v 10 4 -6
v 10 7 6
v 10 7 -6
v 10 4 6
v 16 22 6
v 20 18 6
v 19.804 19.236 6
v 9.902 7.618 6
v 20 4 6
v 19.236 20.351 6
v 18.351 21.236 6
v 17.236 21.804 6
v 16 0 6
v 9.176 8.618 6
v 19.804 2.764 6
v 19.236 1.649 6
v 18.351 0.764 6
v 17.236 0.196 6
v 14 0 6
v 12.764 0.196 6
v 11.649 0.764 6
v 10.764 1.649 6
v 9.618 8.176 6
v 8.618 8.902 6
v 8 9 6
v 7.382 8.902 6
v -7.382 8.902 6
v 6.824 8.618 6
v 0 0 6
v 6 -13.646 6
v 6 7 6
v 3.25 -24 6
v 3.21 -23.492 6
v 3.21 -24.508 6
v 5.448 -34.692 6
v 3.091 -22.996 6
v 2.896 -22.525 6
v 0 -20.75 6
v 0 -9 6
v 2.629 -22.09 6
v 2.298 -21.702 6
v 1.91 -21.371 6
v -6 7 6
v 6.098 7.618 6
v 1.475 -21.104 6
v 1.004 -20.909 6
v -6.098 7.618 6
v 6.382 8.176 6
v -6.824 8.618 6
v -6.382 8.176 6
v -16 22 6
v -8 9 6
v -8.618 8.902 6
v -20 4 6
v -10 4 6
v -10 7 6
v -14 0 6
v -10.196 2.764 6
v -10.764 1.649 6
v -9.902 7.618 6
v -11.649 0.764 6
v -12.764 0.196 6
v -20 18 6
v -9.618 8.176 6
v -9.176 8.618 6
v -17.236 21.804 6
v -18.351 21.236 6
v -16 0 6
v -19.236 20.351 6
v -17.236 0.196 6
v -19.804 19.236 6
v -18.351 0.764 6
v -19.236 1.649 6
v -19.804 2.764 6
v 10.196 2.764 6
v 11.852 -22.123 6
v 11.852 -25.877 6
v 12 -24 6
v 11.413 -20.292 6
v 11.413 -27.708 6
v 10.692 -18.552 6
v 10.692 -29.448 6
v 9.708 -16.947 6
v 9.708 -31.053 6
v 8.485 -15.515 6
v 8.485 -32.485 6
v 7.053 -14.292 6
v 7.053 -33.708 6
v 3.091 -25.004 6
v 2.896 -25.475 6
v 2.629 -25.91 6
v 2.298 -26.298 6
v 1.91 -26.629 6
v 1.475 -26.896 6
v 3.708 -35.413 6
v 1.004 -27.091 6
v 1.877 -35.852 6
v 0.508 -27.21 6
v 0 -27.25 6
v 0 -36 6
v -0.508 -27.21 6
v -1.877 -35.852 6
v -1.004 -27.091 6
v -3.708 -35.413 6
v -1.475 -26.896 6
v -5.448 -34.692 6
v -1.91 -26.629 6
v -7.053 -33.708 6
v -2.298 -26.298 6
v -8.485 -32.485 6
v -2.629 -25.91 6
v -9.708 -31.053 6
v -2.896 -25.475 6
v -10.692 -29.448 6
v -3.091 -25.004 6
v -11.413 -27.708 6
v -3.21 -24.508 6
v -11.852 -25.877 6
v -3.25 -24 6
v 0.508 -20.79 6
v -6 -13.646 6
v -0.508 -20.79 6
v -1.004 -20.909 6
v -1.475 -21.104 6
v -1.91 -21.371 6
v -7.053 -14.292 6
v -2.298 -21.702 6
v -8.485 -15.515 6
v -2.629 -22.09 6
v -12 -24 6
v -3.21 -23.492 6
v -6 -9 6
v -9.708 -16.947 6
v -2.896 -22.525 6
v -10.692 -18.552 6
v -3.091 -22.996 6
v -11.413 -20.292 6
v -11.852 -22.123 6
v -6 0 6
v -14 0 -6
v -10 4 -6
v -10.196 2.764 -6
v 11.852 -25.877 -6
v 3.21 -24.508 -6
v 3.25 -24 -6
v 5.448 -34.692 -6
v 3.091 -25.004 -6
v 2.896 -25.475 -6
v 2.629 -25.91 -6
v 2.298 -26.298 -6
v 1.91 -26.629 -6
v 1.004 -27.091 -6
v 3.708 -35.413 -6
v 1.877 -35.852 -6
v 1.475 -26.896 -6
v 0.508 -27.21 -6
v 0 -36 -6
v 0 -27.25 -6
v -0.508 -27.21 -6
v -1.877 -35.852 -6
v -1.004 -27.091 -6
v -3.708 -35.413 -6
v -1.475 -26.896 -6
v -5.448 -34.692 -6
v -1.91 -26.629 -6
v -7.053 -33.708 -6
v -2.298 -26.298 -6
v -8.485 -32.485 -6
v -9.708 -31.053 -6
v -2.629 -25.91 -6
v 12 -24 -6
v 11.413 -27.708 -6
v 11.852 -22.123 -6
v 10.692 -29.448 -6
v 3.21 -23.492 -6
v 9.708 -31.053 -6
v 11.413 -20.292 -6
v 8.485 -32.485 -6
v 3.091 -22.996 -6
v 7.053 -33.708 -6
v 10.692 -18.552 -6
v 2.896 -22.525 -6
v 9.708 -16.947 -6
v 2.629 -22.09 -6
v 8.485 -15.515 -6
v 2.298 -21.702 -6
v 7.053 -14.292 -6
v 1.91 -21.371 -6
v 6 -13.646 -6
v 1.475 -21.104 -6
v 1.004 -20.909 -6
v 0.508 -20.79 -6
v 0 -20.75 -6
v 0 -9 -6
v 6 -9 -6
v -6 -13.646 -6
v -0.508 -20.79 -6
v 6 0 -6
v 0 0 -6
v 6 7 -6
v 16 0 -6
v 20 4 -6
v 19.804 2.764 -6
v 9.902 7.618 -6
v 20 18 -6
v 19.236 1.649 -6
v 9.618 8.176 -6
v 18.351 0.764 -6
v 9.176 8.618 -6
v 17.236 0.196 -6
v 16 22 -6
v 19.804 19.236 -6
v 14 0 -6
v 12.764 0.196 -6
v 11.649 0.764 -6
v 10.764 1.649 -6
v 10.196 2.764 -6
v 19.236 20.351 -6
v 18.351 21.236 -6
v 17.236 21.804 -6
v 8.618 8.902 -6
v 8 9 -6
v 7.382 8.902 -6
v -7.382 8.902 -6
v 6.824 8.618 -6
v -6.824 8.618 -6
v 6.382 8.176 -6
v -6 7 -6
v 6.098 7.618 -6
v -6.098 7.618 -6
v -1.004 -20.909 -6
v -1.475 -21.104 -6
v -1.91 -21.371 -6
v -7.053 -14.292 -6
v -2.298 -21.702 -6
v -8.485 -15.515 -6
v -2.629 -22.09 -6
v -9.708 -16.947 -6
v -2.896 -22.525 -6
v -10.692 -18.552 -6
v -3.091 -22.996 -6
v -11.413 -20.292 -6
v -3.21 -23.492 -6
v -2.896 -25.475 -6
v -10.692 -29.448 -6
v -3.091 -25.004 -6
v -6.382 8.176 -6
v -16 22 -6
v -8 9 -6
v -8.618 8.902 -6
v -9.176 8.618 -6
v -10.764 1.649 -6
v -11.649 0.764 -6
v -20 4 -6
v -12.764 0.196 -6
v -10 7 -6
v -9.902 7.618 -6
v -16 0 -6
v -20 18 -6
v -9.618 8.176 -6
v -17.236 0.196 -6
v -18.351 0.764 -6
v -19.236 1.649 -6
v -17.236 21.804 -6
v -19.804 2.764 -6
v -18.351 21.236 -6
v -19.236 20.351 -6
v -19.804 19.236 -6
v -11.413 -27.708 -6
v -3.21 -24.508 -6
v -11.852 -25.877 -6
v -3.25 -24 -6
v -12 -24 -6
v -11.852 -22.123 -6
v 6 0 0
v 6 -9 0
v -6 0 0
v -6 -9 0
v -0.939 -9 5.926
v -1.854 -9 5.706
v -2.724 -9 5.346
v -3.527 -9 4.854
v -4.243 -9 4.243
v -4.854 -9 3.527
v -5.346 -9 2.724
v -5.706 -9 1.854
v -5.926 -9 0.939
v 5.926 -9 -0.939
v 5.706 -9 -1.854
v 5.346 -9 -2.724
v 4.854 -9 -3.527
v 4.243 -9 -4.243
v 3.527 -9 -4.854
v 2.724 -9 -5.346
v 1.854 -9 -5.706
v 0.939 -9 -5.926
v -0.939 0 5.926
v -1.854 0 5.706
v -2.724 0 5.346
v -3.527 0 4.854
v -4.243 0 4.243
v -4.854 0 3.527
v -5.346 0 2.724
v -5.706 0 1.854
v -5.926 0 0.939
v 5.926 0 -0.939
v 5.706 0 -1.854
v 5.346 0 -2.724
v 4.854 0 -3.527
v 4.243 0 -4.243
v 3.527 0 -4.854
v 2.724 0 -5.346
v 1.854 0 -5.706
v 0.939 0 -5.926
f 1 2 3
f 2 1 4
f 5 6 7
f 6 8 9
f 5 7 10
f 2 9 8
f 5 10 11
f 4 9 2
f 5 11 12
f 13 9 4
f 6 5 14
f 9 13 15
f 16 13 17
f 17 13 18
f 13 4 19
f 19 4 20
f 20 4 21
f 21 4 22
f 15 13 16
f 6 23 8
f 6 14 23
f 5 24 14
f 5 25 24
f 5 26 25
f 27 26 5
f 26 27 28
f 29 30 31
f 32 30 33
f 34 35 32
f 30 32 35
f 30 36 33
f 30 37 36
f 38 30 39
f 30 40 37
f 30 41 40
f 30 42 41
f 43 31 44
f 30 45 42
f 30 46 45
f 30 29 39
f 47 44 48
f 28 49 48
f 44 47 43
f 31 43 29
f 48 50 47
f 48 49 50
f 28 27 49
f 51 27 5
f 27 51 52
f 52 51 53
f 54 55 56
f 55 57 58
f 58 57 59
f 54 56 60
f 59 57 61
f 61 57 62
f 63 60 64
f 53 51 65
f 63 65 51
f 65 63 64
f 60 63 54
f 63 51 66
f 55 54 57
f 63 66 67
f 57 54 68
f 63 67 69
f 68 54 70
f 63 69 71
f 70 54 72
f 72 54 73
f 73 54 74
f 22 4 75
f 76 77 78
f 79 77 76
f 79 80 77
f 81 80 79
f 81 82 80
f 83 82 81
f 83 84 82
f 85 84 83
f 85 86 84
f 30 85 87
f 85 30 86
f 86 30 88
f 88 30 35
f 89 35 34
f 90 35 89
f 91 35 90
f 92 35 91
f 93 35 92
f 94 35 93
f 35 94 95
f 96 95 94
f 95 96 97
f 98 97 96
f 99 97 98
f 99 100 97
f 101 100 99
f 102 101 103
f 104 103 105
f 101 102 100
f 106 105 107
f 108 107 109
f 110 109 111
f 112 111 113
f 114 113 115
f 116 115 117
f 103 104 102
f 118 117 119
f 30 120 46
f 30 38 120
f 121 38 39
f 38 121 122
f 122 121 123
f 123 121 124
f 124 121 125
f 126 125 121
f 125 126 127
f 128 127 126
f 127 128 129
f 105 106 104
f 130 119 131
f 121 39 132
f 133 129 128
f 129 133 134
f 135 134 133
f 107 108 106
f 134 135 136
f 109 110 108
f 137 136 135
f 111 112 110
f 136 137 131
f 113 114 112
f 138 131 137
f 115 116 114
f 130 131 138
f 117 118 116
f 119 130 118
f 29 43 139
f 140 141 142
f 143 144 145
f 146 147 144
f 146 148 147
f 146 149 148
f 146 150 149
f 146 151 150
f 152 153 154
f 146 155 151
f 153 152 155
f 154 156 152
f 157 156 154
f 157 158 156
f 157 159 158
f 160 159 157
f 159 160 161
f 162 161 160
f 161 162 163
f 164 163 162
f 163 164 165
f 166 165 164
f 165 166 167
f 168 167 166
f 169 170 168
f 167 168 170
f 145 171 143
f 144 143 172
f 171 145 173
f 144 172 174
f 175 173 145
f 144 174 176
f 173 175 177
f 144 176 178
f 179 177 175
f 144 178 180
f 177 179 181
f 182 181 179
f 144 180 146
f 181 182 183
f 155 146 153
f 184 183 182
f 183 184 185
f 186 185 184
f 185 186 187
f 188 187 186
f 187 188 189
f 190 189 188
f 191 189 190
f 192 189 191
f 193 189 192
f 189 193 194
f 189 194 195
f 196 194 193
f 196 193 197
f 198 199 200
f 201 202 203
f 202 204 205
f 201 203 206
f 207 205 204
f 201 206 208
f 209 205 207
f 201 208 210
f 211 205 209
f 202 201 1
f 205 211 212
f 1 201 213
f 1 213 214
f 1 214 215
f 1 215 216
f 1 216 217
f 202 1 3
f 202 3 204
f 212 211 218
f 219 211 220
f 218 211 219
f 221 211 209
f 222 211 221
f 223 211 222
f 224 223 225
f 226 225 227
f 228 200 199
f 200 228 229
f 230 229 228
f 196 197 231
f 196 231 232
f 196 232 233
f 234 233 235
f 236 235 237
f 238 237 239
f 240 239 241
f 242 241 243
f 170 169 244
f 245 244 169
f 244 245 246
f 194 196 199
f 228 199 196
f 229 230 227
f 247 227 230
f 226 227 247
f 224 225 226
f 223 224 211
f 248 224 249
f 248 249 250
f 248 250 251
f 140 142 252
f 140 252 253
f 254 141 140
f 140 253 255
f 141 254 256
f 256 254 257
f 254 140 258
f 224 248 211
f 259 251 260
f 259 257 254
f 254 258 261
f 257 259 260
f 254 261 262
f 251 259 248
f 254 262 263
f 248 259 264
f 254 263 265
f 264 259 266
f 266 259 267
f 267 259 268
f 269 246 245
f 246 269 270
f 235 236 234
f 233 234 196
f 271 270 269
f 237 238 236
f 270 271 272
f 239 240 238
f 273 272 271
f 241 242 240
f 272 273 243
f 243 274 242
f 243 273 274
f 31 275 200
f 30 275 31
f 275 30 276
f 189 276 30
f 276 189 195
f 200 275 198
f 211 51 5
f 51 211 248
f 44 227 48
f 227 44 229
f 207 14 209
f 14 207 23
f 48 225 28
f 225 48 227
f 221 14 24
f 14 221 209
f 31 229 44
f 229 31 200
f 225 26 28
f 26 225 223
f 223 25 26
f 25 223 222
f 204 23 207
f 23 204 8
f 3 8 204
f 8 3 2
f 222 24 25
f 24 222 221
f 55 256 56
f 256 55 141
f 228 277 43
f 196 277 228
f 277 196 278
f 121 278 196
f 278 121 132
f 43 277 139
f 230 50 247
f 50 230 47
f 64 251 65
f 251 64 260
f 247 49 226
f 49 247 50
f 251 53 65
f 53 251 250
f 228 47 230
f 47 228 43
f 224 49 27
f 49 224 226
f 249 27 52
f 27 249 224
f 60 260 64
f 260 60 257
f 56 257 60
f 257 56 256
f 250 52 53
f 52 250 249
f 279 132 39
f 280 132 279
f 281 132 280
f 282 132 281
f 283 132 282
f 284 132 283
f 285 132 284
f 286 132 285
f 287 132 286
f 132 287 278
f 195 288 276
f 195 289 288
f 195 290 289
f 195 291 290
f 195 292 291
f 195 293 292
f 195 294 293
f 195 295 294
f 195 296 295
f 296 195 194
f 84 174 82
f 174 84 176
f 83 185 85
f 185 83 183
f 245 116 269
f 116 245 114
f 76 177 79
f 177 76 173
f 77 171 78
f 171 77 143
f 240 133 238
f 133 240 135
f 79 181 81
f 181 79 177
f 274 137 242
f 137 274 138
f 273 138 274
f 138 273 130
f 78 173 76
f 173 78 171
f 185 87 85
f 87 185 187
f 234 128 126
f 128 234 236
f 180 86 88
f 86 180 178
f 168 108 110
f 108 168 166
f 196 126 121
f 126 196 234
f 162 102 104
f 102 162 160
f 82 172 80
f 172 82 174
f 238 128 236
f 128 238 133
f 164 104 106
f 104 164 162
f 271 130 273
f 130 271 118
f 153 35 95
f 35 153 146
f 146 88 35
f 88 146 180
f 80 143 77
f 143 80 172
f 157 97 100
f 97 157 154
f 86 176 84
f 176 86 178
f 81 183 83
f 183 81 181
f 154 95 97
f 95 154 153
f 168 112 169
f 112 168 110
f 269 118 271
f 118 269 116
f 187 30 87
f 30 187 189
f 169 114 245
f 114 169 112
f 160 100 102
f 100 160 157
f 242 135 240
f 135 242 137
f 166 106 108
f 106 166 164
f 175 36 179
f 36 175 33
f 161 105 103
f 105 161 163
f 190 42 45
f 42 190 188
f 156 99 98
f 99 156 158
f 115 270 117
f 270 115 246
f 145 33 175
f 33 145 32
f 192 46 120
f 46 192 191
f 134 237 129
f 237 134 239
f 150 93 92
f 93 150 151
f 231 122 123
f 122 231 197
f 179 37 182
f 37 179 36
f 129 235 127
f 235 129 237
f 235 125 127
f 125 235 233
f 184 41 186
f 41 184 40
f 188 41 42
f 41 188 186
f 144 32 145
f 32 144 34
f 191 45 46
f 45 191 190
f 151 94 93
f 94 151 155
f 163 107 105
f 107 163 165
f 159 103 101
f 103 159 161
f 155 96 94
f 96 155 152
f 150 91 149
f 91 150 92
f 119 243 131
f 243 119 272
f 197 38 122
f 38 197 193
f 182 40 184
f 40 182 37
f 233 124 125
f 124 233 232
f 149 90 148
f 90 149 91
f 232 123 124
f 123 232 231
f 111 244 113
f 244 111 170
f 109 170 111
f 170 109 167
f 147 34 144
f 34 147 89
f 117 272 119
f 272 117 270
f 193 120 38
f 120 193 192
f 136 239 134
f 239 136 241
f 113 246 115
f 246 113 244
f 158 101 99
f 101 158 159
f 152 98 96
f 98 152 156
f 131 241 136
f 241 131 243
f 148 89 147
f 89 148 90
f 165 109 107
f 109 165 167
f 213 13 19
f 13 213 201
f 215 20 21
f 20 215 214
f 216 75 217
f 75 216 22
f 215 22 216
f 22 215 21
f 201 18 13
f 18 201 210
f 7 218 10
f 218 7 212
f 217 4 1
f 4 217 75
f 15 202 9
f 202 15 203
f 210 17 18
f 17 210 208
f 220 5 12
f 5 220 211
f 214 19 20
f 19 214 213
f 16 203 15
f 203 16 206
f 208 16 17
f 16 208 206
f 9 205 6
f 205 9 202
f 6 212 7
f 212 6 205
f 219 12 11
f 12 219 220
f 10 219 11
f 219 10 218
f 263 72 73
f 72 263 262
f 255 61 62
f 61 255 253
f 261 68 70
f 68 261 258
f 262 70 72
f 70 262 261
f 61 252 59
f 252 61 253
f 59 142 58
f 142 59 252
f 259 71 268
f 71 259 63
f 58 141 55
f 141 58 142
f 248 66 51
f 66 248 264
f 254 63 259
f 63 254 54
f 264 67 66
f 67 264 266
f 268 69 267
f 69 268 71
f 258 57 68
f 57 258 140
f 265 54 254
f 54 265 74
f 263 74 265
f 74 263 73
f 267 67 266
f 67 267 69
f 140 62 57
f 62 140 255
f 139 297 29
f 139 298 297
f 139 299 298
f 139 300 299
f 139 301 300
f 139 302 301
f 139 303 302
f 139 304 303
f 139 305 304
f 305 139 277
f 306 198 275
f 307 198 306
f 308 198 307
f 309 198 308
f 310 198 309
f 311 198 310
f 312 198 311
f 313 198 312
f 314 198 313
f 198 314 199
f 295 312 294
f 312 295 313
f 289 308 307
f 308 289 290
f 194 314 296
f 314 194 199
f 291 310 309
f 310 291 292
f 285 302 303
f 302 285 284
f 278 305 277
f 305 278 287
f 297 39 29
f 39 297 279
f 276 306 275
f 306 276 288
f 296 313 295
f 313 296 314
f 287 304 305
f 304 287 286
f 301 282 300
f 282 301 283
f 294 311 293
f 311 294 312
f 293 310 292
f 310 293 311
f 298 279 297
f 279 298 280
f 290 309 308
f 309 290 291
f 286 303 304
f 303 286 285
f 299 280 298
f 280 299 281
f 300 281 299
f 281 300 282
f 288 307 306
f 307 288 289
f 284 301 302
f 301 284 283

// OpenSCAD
//Rail mount

/*<Written by Rodger Evans, Feb. 14, 2014>
This is a program to generate a mounting fixture to hang items off the rail above the UABC wave tank. This is part of the DESceo project, and will be used in the wave tank in UABC.

    Copyright (C) <2014>  <Rodger Evans, revans@cicese.edu.mx>

    This program is free software: you can redistribute it and/or modify
    it under the terms of the GNU General Public License as published by
    the Free Software Foundation, either version 3 of the License, or
    (at your option) any later version.

    This program is distributed in the hope that it will be useful,
    but WITHOUT ANY WARRANTY; without even the implied warranty of
    MERCHANTABILITY or FITNESS FOR A PARTICULAR PURPOSE.  See the
    GNU General Public License for more details.

    You should have received a copy of the GNU General Public License
    along with this program.  If not, see <http://www.gnu.org/licenses/>.
*/

//parameters for the main bracket

PieceThickness=12;//thickness of the whole piece
cynRad=4;//radius of the corners; was 2
div=20;//resoultion
delta=0.2;//extra thickness to make subtractions easier

C1h=22;//cube 1 height,. was 25
C1w=10;//cube 1 width
C1cylR=cynRad;//radius of the cylinder of the rounded sides 

C2h=13;//cubo2 is the part above the upper part of the rail.was 15
C2w=4;

C3h=22;//cube 3 is the center top of the piece, was 22
C3w=12;

C4h=15;
C4w=12;

C5h=1;
C5w=12;

CyER=C4w;//external radius of the bottom cylinder
CyIR=6.5/2;//inner radius of the bottom cylinder

C7h=10;
C7w=36;
C6h=C7h+5;
C6w=C7h;
C67p=PieceThickness+10;
fit=0.5;//the space for cube6 to fit 
C7d=3;//distance from hole to C6

module cube1(){
hull(){
	translate([C3w/2+C2w+cynRad/2,C1h-cynRad/2,0]) cube([cynRad,cynRad,PieceThickness],center=true);
	translate([C3w/2+C2w+cynRad,cynRad,0]) cylinder(h=PieceThickness, r=cynRad, center=true,$fn=div);
	translate([C3w/2+C2w+C1w-cynRad,cynRad,0]) cylinder(h=PieceThickness, r=cynRad, center=true,$fn=div);
	translate([C3w/2+C2w+C1w-cynRad,C1h-cynRad,0]) cylinder(h=PieceThickness, r=cynRad, center=true,$fn=div);
	}
}

module cube2(){
	C2hh=(C2h+cynRad/2);
	difference(){
		translate([C3w/2+C2w/2,C3h-C2hh/2,0])cube([C2w,C2hh, PieceThickness],center=true);
		hull(){
			translate([C3w/2+cynRad/2,C1h-C2h-cynRad/2,0]) cylinder(h=PieceThickness+delta,r=cynRad/2,center=true, $fn=div);
			translate([C3w/2+C2w-cynRad/2,C1h-C2h-cynRad/2,0])	cylinder(h=PieceThickness+delta,r=cynRad/2,center=true, $fn=div);
		}
	}
}
module cube3(){
translate([0,C3h/2,0])cube([C3w,C3h,PieceThickness],center=true);
}

module cube4(){
	cy4Rad=PieceThickness/2;
	translate([0,-C4h/2,0])
	rotate([90,0,0])
	hull(){
	cylinder(h=C4h,r=cy4Rad, center=true,$fn=2*div);		translate([cy4Rad-cynRad/4,cy4Rad-cynRad/4,0])cube([cynRad/2,cynRad/2,C4h],center=true);
	translate([-cy4Rad+cynRad/4,-cy4Rad+cynRad/4,0])cube([cynRad/2,cynRad/2,C4h],center=true);
	}
}

module cube5(){
	difference(){
	union(){
	translate([0,-C4h-C5h/2,0])cube([C5w,C5h+CyER,PieceThickness],center=true);
			translate([0,-C4h-C5h-2/3*CyER,0])cylinder(h=PieceThickness,r=CyER,center=true,$fn=2*div);
			}
	translate([0,-C4h-C5h-2/3*CyER,0])cylinder(h=PieceThickness+delta,r=CyIR,center=true,$fn=2*div);
	}
}

module cube6(){
translate([-C4w/2-fit-C7d-C6w/2,-C6h,0]) cube([C6w,C6h,C67p],center=true);
difference(){
	translate([17/2,-C6h-C6h/2+C7h/2,0])cube([C7w,C7h,C67p],center=true);
	translate([0,-C6h-C6h/2+C7h/2,0])cube([C4w+2*fit,C7h+delta,C4w+2*fit],center=true);//the hole
	translate([C4w/2+fit+C7d+6,-C6h-C6h/2+C7h/2+3,0])cube([12,5,12],center=true);
	translate([C4w/2+fit+C7d+6,-C6h-C6h/2+C7h/2,0])rotate([90,0,0])cylinder(h=C4w+2*fit, r=6.5/2,center=true);
}
}
//*
union(){
cube1();
mirror([1,0,0])cube1();
cube2();
mirror([1,0,0])cube2();
cube3();
cube4();
cube5();
}
//*/
//rotate([90,0,0])cube6();
